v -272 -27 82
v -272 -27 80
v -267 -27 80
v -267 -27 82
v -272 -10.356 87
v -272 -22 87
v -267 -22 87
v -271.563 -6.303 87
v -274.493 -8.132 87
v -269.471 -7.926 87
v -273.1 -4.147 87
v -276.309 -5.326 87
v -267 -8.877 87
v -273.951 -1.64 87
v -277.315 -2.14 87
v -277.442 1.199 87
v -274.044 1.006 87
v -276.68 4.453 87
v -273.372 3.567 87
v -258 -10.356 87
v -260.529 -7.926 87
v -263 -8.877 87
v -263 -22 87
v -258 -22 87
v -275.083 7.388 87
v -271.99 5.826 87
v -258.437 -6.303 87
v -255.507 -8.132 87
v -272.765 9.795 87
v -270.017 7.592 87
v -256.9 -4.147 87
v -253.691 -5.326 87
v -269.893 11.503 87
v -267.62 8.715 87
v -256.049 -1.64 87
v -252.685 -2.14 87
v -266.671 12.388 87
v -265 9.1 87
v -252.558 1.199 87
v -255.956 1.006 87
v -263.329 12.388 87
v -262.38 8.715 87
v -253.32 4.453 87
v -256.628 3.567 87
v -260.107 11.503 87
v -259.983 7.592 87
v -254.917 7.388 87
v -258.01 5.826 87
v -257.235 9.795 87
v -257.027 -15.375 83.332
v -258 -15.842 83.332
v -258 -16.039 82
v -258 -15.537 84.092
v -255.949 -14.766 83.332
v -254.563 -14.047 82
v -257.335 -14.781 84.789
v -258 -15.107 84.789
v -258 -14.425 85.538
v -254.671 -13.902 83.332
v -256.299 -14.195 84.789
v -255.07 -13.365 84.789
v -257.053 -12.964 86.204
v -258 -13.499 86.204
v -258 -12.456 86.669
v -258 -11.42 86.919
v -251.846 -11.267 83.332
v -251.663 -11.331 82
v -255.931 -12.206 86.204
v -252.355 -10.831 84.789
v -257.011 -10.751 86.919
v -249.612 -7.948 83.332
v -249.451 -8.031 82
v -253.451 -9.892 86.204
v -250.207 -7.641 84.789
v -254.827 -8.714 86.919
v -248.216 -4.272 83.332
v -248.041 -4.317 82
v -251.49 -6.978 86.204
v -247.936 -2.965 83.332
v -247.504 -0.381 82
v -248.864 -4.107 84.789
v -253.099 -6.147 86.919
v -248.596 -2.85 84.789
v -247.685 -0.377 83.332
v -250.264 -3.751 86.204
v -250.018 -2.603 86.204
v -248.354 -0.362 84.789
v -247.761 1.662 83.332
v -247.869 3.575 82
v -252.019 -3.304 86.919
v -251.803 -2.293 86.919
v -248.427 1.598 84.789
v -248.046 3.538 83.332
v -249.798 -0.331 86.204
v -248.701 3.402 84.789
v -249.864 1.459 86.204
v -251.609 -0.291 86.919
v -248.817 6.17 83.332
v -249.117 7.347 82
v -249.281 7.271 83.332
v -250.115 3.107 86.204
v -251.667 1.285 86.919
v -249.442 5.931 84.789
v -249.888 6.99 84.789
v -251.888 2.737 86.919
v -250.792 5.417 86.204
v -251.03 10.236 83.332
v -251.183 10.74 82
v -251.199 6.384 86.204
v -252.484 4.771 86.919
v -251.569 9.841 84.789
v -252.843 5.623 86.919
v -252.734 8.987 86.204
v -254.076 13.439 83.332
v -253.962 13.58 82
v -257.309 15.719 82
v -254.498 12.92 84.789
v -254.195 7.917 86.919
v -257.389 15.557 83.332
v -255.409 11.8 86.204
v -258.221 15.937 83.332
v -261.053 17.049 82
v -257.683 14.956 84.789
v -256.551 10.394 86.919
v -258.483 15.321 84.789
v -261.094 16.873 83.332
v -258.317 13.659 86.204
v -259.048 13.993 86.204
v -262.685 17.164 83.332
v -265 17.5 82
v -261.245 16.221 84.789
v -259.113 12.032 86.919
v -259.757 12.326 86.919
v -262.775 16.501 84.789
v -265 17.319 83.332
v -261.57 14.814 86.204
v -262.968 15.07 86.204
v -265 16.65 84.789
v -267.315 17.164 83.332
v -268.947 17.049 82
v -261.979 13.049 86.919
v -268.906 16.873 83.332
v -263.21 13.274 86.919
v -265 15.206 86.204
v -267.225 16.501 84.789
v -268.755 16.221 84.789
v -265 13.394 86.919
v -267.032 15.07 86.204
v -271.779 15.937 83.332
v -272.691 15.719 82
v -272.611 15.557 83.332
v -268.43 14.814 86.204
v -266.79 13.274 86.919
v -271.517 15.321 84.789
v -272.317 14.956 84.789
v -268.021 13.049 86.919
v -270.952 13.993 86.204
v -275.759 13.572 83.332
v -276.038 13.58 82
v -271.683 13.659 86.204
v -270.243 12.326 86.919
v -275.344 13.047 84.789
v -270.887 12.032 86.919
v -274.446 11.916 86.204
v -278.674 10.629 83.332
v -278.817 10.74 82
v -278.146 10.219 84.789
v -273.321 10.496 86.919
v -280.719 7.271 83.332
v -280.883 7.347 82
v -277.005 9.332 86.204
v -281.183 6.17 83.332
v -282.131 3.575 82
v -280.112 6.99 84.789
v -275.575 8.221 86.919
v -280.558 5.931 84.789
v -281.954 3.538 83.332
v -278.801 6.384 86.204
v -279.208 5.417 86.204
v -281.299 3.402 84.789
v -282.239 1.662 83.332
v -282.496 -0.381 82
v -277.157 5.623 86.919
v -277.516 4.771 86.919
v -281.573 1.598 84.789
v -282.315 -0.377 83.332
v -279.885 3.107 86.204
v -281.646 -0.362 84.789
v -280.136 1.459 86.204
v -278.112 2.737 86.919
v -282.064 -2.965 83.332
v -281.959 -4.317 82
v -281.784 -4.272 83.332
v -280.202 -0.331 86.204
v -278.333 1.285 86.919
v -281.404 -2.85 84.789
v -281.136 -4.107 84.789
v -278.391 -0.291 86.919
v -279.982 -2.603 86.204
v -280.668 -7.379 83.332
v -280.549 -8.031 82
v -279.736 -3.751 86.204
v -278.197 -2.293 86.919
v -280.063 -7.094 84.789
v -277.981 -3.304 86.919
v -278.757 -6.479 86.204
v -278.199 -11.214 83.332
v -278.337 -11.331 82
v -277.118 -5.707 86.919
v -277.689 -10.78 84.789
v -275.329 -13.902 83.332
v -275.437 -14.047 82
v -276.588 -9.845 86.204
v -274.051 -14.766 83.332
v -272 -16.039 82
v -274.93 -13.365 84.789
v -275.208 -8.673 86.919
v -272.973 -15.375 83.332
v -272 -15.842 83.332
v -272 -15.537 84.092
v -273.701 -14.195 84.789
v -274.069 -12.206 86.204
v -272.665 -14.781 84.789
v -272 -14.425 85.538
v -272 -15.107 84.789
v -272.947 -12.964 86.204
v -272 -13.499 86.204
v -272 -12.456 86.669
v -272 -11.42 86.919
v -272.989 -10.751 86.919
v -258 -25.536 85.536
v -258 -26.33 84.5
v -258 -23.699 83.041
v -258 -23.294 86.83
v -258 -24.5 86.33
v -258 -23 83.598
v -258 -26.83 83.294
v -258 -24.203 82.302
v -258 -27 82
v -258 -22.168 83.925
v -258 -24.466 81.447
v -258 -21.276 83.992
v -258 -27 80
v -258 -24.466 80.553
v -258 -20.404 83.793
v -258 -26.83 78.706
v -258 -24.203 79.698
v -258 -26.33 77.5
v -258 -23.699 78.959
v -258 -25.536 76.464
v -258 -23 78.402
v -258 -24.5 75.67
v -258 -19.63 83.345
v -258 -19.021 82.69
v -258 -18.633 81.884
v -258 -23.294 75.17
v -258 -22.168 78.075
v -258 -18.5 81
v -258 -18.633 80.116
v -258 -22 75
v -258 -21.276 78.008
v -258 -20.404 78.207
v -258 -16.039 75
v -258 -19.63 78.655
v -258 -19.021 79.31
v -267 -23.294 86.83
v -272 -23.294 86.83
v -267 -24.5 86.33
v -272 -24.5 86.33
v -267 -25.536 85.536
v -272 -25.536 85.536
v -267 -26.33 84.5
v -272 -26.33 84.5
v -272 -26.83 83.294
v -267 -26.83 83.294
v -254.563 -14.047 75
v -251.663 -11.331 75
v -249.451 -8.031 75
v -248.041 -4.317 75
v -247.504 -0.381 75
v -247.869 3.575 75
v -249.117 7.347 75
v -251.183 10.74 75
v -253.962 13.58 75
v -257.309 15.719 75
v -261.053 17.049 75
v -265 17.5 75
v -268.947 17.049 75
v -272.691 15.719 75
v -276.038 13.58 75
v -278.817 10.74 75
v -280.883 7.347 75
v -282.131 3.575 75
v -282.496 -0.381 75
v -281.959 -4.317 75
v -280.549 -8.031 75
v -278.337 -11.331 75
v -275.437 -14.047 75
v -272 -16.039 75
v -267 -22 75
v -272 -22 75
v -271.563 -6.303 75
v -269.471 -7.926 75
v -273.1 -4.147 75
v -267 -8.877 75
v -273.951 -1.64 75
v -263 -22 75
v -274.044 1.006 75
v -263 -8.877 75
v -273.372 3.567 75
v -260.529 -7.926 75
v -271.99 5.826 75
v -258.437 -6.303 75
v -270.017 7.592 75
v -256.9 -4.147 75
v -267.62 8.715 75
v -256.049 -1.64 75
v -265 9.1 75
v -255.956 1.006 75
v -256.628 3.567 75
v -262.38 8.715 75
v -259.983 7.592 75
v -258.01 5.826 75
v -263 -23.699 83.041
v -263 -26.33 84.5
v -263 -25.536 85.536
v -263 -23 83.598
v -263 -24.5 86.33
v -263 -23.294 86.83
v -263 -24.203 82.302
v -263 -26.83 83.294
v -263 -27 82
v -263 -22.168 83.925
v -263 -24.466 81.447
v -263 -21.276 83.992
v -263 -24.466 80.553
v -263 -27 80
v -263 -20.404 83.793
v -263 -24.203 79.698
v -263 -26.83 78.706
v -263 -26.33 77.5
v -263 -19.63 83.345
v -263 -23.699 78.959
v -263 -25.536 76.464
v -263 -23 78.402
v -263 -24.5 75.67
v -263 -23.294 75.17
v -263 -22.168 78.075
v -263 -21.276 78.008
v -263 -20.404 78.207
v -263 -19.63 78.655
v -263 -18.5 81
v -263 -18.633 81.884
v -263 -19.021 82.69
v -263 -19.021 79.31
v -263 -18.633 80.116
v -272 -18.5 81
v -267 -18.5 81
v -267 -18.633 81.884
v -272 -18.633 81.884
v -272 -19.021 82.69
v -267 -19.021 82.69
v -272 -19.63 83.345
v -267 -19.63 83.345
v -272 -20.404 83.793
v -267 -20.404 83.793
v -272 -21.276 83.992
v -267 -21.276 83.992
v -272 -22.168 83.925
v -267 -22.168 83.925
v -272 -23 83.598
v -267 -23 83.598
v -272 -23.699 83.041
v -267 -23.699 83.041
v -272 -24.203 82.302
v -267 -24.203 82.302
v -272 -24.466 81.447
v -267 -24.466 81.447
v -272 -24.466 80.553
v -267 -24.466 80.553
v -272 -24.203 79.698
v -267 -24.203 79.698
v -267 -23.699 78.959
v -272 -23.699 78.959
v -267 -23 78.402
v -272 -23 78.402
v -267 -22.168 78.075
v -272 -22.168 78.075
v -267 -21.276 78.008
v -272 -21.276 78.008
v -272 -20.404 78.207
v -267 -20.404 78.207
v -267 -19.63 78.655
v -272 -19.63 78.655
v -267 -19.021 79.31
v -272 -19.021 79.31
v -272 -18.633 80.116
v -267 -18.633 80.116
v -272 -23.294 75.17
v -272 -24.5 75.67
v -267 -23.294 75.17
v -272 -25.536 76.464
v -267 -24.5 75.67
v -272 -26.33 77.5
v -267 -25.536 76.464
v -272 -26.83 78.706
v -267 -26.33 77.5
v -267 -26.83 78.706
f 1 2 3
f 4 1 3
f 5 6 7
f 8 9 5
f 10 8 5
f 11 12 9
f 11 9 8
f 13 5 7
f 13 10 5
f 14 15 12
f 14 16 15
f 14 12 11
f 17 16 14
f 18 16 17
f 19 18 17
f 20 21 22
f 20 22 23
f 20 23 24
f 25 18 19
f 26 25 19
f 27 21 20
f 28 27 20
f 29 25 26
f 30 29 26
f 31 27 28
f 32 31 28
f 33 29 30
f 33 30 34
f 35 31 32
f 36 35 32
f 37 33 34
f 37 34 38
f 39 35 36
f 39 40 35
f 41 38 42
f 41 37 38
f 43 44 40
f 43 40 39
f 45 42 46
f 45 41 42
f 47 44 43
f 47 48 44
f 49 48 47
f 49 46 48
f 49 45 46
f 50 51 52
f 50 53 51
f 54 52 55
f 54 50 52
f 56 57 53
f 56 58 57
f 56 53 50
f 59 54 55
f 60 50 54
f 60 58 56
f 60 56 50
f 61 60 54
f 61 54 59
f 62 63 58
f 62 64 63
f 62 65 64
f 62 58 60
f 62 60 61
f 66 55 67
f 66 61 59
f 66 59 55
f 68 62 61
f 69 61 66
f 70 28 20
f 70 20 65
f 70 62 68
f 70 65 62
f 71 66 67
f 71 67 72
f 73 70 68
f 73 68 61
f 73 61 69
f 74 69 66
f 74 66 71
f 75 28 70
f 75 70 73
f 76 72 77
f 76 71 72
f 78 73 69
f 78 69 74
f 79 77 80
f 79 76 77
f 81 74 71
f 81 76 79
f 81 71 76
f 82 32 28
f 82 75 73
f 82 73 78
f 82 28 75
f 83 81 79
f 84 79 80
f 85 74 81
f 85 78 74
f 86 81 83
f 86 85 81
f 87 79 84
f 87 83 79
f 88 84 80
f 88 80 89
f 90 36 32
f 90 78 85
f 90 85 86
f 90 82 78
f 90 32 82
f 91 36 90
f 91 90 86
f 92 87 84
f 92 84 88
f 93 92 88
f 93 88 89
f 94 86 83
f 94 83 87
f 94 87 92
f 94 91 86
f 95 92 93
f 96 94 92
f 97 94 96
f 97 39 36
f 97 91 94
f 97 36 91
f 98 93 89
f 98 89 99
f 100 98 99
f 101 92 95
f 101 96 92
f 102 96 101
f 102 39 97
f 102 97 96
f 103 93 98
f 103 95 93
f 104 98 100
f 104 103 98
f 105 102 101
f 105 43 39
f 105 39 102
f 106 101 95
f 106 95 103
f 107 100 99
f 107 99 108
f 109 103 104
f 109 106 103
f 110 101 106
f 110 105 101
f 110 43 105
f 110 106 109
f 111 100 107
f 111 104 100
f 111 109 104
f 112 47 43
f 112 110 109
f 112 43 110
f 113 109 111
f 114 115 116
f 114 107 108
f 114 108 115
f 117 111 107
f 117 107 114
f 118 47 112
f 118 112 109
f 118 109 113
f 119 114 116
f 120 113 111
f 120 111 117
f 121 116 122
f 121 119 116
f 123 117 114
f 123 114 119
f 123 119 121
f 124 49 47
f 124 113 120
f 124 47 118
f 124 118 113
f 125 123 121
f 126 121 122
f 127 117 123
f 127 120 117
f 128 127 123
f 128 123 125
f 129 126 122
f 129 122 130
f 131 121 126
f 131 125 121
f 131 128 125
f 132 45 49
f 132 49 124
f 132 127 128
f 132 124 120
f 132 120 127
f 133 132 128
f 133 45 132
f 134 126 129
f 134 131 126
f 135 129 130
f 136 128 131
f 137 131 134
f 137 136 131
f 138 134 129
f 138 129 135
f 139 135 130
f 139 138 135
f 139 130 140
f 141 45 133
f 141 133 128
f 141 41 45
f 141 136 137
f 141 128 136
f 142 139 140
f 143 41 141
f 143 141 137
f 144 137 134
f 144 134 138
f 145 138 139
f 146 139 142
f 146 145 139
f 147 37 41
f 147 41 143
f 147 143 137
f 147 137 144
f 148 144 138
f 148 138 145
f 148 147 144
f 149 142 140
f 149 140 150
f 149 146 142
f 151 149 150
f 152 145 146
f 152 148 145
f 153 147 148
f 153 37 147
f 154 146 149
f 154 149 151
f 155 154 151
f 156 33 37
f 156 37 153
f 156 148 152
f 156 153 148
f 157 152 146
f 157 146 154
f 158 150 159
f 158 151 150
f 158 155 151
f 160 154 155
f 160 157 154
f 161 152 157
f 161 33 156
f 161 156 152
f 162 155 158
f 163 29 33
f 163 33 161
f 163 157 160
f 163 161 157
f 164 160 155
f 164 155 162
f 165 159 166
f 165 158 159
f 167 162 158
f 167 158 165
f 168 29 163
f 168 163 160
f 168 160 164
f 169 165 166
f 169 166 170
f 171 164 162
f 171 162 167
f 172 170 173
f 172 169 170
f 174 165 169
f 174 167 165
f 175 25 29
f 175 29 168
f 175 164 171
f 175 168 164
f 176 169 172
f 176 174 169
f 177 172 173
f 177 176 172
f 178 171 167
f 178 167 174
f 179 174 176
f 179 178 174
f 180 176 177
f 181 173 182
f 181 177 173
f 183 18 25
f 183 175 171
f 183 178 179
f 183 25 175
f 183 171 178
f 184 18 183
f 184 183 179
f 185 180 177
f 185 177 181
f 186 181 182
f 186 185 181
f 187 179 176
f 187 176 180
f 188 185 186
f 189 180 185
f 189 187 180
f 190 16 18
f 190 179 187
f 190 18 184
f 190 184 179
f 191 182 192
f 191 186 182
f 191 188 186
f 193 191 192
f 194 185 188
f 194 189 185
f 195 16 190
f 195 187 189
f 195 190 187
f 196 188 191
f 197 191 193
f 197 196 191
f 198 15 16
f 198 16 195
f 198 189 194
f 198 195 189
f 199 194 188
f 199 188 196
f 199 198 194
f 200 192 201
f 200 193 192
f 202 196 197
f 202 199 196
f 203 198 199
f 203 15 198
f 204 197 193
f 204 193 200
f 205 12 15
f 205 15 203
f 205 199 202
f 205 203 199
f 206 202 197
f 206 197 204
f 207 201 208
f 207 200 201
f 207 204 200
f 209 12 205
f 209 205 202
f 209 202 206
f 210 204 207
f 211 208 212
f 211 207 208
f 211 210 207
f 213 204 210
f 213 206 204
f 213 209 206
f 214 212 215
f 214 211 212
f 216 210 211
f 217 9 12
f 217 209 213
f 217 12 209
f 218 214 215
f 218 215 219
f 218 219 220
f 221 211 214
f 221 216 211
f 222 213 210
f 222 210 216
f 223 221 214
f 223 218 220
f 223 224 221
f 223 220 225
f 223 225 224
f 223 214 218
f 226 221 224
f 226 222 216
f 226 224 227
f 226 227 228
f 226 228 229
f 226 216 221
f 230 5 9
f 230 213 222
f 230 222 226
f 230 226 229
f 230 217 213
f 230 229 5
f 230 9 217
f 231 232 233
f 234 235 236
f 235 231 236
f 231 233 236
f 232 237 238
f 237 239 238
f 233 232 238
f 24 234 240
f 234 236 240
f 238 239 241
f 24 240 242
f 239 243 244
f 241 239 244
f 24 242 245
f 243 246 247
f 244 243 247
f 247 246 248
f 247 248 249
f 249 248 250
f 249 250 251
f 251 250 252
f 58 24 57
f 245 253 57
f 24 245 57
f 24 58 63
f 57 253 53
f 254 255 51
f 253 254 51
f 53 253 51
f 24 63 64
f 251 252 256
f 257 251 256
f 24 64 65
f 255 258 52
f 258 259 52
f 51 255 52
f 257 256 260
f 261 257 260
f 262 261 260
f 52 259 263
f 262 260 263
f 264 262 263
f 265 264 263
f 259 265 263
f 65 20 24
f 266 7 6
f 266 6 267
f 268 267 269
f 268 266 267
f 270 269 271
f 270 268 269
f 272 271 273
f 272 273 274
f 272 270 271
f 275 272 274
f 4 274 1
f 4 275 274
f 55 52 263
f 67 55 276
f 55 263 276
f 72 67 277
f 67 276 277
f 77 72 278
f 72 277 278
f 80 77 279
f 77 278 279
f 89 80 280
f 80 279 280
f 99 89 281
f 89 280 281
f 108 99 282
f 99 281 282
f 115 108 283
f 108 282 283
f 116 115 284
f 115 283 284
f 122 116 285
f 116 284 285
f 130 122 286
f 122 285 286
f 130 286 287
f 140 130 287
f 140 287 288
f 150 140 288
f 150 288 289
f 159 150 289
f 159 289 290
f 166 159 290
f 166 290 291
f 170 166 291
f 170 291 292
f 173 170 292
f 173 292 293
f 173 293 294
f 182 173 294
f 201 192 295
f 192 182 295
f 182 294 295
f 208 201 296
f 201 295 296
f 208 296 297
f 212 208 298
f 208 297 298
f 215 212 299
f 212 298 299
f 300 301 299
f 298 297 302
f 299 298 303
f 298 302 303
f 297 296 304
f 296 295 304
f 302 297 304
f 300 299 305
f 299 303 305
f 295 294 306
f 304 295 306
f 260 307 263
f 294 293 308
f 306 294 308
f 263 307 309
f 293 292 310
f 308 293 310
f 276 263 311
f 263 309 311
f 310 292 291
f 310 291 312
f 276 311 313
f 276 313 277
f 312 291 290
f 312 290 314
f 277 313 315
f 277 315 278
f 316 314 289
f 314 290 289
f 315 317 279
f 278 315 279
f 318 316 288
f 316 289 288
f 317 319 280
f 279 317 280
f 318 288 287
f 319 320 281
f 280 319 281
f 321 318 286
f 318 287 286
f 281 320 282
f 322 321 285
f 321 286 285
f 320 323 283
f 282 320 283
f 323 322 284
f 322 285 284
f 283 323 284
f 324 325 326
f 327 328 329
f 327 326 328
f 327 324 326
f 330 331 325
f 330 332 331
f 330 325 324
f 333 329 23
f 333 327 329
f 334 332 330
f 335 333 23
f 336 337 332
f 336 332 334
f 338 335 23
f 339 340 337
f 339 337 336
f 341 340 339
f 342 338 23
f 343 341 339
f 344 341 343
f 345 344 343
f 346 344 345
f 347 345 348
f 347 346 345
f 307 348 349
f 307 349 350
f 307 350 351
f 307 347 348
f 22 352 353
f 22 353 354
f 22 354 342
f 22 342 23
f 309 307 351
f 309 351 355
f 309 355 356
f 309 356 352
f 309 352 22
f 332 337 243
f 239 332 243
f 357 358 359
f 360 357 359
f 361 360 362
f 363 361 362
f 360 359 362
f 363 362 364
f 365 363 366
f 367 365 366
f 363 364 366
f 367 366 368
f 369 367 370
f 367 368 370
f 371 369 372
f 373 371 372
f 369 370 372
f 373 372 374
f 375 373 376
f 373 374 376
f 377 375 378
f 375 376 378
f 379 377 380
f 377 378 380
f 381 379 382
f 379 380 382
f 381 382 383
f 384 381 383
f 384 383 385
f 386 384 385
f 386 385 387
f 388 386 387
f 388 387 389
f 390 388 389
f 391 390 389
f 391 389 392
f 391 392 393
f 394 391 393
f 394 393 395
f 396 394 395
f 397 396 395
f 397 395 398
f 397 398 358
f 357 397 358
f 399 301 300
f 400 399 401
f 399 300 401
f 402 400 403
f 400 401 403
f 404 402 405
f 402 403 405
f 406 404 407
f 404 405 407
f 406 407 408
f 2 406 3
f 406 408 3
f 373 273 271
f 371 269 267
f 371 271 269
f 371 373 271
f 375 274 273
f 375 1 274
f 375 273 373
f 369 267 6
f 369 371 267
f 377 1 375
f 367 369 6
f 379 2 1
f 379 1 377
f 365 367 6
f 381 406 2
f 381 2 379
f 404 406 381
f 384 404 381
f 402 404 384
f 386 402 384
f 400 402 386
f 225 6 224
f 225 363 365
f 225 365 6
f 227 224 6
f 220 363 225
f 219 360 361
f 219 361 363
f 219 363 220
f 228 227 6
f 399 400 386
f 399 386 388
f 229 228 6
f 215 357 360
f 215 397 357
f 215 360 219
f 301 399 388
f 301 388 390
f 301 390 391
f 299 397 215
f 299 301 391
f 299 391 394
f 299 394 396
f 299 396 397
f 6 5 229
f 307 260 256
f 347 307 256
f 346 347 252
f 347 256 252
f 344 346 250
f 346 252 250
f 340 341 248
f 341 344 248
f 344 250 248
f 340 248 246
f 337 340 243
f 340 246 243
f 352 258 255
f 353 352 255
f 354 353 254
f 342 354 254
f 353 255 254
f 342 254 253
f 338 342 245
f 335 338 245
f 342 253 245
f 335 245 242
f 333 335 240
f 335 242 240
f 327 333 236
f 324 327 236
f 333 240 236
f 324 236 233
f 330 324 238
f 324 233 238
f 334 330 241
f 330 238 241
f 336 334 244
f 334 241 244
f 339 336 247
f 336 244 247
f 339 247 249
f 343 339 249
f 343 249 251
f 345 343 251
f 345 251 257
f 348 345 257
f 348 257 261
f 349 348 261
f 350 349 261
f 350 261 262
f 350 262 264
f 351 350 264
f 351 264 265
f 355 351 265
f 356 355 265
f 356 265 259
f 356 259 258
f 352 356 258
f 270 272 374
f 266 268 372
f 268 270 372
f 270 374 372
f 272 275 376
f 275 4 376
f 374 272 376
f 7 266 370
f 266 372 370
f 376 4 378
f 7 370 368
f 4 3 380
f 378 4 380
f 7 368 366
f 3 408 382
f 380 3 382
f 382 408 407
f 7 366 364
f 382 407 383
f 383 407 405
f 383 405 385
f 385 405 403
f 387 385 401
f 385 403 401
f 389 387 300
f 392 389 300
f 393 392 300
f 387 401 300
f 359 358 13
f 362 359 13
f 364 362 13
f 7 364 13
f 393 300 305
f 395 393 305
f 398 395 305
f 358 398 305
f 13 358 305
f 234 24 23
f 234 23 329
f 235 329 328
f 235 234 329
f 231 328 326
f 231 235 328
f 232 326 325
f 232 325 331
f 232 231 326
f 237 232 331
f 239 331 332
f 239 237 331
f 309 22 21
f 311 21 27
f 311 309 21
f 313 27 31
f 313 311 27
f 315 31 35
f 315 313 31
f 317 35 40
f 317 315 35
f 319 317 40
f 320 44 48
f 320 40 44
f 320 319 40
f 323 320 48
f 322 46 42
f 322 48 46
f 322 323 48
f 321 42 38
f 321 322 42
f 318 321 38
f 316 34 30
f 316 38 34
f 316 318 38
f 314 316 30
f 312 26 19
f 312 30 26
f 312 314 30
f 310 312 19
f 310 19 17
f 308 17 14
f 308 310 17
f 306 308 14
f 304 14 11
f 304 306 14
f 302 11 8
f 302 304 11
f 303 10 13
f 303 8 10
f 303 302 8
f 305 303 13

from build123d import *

# Parameters (mm, degrees)
CYLINDER001_R     = 17.5
CYLINDER001_DEPTH = 12
FILLET001_R       = 5
BOX003_W          = 14
BOX003_H          = 17
BOX003_DEPTH      = 12
CYLINDER002_R     = 9.1
CYLINDER002_DEPTH = 12
FILLET002_R       = 5
BOX004_W          = 4
BOX004_H          = 19
BOX004_DEPTH      = 12
SKETCH006_R       = 3
HOLE_DEPTH        = 25


with BuildPart() as part:
    # Cylinder001 → Cylinder001 (join)
    with BuildSketch(Plane.XY):
        Circle(CYLINDER001_R)
    extrude(amount=CYLINDER001_DEPTH)

    # Fillet001
    fillet001_edges = [part.edges().sort_by_distance(p)[0] for p in [
        (-17.5, 0, 12),
    ]]
    fillet(fillet001_edges, radius=FILLET001_R)

    # Box003 → Box003 (join)
    with BuildSketch(Plane(origin=(-7, -27, 0), x_dir=(1, 0, 0), z_dir=(0, 0, 1))):
        with Locations((7, 8.5)):
            Rectangle(BOX003_W, BOX003_H)
    extrude(amount=BOX003_DEPTH)

    # Cylinder002 → Cylinder002 (cut)
    with BuildSketch(Plane.XY):
        Circle(CYLINDER002_R)
    extrude(amount=CYLINDER002_DEPTH, mode=Mode.SUBTRACT)

    # Fillet002
    fillet002_edges = [part.edges().sort_by_distance(p)[0] for p in [
        (0, -27, 12),
        (0, -27, 0),
    ]]
    fillet(fillet002_edges, radius=FILLET002_R)

    # Box004 → Box004 (cut)
    with BuildSketch(Plane(origin=(-2, -27, 0), x_dir=(1, 0, 0), z_dir=(0, 0, 1))):
        with Locations((2, 9.5)):
            Rectangle(BOX004_W, BOX004_H)
    extrude(amount=BOX004_DEPTH, mode=Mode.SUBTRACT)

    # Sketch006 (on Face1 of Box004) → Hole (cut)
    with BuildSketch(Plane(origin=(7, -27, 0), x_dir=(0, 1, 0), z_dir=(1, 0, 0))):
        with Locations((5.5, 6)):
            Circle(SKETCH006_R)
    extrude(amount=-HOLE_DEPTH, mode=Mode.SUBTRACT)


with BuildPart() as part_1:
    # Body004 placement: moved
    add(part.part.moved(Location((-265, 0, 75))))


solid = part_1.part
